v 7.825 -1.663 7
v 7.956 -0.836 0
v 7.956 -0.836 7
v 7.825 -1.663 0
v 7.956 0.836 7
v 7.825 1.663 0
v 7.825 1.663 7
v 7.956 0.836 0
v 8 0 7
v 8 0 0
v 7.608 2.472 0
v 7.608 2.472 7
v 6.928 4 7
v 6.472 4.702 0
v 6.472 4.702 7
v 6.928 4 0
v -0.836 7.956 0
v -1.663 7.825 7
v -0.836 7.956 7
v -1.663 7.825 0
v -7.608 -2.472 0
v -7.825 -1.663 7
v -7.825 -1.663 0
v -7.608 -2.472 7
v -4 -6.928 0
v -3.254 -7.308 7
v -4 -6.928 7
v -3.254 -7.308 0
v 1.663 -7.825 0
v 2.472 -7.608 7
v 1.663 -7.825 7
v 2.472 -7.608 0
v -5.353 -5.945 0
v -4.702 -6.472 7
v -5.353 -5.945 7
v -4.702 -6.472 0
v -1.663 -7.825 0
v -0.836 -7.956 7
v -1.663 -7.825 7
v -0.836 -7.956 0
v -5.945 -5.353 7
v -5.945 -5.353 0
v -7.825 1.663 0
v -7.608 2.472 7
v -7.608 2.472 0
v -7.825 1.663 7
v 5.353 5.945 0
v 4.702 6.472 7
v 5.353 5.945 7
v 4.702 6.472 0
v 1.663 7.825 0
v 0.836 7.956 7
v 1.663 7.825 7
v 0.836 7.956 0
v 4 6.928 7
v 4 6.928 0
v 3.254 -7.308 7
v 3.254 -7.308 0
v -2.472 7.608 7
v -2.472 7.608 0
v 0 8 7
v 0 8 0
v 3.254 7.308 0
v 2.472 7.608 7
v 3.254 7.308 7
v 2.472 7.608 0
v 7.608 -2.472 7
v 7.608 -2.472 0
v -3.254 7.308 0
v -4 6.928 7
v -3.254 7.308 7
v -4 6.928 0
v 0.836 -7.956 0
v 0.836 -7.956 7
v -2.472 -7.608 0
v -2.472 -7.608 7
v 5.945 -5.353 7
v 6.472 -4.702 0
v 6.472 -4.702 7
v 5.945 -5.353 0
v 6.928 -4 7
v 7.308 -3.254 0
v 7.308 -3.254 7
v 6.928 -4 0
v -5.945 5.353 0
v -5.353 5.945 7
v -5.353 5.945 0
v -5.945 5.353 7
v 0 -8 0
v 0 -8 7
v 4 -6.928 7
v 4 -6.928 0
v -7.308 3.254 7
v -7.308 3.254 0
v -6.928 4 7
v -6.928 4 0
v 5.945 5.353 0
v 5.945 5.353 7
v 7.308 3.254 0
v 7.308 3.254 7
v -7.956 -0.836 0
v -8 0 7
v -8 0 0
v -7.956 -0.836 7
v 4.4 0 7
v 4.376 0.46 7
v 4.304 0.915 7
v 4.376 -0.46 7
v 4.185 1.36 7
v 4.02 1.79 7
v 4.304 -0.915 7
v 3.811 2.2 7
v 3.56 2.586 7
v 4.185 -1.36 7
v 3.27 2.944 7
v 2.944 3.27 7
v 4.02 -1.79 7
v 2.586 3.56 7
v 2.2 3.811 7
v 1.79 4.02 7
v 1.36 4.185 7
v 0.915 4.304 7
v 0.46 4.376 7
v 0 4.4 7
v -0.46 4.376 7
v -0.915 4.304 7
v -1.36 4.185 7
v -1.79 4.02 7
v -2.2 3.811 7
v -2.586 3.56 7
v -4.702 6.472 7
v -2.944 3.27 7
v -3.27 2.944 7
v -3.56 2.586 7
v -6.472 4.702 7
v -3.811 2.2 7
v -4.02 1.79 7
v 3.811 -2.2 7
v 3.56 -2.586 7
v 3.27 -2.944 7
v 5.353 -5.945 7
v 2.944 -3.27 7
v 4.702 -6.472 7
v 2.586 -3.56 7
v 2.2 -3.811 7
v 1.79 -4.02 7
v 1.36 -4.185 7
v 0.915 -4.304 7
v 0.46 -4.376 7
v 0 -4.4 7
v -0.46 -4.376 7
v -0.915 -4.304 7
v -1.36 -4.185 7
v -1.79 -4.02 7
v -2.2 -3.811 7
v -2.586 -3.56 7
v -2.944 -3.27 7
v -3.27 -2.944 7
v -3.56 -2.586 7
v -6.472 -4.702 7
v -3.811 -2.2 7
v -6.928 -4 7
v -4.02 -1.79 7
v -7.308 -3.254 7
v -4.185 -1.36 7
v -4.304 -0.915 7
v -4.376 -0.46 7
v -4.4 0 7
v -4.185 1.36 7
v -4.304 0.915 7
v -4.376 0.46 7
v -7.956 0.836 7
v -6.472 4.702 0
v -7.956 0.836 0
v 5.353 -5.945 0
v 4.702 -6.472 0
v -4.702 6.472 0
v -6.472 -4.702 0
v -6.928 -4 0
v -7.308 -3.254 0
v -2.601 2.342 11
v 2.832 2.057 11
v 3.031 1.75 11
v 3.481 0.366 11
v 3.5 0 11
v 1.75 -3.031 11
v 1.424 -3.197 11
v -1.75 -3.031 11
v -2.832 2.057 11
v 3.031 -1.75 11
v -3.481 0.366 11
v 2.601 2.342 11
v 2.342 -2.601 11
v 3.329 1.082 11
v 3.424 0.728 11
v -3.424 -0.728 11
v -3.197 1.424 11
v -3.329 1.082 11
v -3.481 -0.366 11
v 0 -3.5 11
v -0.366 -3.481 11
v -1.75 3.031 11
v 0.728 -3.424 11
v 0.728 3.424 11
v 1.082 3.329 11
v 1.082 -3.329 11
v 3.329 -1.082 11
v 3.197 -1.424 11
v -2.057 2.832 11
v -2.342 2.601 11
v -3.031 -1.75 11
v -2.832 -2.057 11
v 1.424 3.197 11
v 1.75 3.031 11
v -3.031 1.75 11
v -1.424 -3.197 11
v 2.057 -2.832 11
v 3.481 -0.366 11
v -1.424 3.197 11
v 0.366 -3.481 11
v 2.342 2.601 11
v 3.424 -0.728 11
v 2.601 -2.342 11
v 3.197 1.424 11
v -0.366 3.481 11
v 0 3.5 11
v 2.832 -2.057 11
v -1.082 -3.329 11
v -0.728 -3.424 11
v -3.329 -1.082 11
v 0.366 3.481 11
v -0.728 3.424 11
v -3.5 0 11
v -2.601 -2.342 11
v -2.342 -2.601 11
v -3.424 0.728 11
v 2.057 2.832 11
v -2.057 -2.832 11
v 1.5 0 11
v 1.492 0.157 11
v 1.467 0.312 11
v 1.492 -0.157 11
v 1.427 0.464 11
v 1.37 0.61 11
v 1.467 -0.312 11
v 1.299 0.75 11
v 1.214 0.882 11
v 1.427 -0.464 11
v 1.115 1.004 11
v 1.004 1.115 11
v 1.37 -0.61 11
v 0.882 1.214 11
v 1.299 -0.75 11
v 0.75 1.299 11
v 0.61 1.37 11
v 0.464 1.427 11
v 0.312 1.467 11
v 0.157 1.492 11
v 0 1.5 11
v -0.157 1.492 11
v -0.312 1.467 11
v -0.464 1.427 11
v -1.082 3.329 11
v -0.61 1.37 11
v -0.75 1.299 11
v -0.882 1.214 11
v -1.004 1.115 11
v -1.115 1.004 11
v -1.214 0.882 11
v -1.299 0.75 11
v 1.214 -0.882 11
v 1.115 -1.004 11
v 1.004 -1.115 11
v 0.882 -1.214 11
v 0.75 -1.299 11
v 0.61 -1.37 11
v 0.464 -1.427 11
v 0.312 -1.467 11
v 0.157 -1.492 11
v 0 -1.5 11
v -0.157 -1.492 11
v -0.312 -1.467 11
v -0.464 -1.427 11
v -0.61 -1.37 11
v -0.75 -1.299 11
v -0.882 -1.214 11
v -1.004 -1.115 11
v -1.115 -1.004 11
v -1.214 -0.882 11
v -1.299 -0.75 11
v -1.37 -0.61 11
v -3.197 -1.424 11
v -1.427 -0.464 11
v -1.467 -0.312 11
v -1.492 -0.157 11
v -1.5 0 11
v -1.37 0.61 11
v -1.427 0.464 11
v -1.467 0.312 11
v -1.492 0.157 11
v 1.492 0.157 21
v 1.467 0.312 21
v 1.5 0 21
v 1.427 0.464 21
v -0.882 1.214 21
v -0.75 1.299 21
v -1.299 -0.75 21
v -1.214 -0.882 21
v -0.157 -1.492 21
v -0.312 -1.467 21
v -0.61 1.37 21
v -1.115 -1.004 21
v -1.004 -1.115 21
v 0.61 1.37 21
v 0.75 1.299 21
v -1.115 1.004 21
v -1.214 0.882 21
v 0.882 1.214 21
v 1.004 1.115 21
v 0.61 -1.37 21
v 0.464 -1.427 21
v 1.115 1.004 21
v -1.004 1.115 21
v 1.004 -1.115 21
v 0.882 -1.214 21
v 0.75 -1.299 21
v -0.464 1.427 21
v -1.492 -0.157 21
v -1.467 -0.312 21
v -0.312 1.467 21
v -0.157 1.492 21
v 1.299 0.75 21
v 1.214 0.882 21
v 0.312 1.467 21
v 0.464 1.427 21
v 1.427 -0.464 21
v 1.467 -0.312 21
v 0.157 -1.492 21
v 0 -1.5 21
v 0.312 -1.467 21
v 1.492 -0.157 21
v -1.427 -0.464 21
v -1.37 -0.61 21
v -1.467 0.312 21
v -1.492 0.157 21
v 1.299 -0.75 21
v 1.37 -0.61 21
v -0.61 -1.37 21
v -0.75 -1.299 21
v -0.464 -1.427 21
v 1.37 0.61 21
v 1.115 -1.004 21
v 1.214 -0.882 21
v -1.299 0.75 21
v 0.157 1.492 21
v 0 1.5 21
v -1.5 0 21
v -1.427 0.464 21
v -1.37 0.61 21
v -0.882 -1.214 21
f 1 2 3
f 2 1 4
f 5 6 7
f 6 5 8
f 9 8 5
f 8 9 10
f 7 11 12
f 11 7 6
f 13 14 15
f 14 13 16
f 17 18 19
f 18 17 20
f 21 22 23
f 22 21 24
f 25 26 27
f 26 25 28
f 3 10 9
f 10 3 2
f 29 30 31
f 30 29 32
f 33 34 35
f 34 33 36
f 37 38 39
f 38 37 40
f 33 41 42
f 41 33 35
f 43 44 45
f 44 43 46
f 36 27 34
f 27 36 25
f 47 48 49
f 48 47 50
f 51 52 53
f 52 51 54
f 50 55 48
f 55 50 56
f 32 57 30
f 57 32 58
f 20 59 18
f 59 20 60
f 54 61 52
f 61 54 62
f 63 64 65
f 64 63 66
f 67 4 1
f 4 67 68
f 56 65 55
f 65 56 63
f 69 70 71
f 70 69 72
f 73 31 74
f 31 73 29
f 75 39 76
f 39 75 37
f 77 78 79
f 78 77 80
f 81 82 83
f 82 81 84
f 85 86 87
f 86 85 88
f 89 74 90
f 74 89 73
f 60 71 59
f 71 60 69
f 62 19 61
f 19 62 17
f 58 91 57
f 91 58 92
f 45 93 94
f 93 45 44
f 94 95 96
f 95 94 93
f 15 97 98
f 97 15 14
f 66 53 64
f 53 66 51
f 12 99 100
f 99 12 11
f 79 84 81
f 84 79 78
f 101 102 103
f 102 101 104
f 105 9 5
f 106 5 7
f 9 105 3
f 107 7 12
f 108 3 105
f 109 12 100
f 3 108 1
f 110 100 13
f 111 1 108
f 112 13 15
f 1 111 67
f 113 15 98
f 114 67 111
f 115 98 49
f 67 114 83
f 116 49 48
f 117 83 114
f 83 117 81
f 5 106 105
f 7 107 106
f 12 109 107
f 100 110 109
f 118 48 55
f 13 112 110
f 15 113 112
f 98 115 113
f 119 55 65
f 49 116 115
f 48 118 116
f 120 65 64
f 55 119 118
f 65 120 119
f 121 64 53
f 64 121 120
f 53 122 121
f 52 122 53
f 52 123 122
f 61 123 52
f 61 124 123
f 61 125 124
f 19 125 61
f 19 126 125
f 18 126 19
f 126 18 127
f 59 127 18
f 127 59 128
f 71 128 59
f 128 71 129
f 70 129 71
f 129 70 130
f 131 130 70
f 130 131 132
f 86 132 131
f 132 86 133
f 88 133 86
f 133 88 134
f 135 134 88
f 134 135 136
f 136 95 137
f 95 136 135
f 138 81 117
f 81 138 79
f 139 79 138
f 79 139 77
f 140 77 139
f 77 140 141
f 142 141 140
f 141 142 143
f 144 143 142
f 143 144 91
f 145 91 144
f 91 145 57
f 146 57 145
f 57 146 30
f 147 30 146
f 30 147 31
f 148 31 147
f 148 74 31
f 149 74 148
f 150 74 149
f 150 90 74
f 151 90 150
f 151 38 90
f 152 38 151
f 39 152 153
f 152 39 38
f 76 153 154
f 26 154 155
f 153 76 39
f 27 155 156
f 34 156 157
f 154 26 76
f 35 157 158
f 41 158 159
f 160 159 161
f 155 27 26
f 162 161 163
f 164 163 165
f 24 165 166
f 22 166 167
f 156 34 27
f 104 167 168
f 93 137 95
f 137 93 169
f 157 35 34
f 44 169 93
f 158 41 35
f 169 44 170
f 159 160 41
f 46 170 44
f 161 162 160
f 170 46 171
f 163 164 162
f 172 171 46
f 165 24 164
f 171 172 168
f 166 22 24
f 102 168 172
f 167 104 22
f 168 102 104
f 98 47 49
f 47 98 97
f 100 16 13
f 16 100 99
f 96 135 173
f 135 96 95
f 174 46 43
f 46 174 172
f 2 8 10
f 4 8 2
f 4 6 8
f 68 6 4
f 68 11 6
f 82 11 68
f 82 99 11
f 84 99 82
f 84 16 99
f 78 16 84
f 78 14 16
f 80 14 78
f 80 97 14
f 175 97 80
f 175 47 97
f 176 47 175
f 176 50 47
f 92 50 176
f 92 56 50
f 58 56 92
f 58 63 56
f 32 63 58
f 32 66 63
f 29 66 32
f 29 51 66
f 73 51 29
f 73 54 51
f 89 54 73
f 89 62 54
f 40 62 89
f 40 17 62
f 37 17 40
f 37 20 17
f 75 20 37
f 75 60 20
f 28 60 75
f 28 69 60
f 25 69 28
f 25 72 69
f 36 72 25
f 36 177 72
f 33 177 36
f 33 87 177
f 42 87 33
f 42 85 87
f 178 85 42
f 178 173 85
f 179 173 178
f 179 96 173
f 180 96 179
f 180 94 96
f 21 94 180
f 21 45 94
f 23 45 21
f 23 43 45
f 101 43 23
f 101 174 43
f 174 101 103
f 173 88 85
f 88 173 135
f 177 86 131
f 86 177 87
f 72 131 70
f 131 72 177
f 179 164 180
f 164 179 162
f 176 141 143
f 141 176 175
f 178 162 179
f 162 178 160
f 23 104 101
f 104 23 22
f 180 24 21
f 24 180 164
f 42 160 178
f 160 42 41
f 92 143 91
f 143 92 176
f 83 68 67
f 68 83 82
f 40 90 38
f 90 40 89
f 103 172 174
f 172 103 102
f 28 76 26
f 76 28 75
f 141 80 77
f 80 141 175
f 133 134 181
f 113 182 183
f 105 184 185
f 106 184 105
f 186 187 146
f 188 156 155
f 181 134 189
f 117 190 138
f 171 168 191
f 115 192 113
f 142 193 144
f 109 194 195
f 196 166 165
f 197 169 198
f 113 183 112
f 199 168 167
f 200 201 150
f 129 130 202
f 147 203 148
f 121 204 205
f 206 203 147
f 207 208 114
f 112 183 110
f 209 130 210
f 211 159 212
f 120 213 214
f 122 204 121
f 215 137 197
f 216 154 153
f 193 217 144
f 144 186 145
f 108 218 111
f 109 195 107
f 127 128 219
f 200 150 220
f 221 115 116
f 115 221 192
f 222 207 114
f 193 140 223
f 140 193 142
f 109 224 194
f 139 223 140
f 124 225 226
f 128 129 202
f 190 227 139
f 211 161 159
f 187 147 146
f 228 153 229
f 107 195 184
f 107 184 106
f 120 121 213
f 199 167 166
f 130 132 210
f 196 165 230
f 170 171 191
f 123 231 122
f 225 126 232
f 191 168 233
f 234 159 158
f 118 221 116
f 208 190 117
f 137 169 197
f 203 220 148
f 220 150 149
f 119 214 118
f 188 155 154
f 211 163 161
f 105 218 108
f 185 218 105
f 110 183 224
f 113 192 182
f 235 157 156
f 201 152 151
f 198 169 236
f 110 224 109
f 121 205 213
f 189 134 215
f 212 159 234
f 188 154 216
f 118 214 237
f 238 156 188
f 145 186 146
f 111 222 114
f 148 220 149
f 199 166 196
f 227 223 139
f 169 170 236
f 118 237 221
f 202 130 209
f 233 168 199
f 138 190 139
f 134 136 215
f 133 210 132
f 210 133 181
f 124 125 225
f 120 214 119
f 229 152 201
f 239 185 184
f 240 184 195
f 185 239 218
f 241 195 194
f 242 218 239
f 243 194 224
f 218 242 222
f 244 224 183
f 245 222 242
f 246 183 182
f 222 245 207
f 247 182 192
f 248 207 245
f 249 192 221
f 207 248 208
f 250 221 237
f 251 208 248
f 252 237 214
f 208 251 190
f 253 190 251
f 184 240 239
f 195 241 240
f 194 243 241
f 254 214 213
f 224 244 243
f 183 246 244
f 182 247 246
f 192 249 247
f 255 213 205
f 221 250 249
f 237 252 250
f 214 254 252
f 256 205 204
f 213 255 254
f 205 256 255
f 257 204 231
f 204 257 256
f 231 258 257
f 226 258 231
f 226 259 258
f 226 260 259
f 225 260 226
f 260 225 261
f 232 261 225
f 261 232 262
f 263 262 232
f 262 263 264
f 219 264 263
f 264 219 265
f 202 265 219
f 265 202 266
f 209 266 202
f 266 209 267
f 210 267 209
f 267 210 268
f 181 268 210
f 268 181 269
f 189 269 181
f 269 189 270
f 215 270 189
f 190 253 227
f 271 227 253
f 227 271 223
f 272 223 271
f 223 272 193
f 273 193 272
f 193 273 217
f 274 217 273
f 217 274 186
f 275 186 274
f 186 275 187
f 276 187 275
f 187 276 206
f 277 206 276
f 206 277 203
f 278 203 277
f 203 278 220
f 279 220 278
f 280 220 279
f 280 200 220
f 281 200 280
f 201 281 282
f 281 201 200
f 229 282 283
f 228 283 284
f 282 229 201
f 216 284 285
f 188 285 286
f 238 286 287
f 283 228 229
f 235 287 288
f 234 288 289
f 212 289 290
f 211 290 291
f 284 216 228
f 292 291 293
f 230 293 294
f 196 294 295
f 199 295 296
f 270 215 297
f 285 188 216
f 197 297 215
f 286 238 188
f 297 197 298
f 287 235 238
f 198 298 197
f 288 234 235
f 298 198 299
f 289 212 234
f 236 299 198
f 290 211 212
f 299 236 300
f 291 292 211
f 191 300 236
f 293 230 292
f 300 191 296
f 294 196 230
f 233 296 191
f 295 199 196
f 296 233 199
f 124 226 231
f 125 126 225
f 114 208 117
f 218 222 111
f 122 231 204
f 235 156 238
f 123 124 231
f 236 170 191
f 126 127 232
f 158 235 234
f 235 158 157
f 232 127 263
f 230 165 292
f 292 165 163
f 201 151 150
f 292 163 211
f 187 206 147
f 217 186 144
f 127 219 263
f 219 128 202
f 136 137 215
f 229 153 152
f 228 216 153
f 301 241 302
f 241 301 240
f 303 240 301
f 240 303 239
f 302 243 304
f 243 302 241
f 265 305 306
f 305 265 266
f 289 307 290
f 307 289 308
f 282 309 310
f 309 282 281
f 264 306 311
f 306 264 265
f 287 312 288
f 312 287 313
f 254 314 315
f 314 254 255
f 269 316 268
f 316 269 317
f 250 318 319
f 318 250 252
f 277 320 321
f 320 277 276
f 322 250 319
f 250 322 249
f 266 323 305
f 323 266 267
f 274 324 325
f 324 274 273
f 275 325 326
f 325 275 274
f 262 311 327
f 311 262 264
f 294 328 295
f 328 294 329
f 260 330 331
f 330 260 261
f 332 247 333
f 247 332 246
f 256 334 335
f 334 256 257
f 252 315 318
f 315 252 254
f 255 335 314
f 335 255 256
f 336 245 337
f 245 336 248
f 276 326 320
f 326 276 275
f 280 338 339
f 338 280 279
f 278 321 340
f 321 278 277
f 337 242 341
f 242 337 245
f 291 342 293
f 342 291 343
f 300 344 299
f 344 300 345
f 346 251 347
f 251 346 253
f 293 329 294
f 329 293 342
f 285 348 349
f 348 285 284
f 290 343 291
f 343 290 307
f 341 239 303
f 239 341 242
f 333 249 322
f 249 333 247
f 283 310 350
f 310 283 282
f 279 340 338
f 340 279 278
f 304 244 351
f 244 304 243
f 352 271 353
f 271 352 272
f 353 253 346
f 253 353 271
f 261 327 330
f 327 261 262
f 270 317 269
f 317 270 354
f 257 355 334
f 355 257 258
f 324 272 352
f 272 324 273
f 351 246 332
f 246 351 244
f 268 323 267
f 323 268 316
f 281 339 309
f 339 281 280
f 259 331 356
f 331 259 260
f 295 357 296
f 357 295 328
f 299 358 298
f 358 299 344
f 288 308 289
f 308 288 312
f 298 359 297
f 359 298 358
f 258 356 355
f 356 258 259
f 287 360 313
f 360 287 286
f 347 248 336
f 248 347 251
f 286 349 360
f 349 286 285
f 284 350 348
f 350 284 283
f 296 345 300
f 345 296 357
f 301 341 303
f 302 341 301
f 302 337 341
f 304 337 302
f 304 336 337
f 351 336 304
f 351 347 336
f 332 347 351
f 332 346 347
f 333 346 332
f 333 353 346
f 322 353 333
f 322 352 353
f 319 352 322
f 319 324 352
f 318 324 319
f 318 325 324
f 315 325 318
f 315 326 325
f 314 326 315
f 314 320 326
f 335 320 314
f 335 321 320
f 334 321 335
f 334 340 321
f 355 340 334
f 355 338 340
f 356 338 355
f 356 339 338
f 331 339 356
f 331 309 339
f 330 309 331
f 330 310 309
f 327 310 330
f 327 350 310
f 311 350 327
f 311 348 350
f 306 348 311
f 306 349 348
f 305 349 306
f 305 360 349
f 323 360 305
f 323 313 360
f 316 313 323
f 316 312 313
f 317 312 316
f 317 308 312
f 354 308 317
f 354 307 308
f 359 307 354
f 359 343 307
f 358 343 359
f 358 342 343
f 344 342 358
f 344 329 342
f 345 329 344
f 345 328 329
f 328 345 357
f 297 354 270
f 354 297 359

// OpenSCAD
// Adjustable leveling foot, smooth threaded-shaft representation.
$fn = 60;
eps = 0.02;
shaft_d = 3;
pad_d = 16;
shaft_l = 10;
pad_h = 7;
union() {
    cylinder(d = pad_d, h = pad_h);
    translate([0, 0, pad_h]) cylinder(d1 = pad_d * 0.55, d2 = shaft_d + 4, h = 4);
    translate([0, 0, pad_h + 4]) cylinder(d = shaft_d, h = shaft_l);
}
